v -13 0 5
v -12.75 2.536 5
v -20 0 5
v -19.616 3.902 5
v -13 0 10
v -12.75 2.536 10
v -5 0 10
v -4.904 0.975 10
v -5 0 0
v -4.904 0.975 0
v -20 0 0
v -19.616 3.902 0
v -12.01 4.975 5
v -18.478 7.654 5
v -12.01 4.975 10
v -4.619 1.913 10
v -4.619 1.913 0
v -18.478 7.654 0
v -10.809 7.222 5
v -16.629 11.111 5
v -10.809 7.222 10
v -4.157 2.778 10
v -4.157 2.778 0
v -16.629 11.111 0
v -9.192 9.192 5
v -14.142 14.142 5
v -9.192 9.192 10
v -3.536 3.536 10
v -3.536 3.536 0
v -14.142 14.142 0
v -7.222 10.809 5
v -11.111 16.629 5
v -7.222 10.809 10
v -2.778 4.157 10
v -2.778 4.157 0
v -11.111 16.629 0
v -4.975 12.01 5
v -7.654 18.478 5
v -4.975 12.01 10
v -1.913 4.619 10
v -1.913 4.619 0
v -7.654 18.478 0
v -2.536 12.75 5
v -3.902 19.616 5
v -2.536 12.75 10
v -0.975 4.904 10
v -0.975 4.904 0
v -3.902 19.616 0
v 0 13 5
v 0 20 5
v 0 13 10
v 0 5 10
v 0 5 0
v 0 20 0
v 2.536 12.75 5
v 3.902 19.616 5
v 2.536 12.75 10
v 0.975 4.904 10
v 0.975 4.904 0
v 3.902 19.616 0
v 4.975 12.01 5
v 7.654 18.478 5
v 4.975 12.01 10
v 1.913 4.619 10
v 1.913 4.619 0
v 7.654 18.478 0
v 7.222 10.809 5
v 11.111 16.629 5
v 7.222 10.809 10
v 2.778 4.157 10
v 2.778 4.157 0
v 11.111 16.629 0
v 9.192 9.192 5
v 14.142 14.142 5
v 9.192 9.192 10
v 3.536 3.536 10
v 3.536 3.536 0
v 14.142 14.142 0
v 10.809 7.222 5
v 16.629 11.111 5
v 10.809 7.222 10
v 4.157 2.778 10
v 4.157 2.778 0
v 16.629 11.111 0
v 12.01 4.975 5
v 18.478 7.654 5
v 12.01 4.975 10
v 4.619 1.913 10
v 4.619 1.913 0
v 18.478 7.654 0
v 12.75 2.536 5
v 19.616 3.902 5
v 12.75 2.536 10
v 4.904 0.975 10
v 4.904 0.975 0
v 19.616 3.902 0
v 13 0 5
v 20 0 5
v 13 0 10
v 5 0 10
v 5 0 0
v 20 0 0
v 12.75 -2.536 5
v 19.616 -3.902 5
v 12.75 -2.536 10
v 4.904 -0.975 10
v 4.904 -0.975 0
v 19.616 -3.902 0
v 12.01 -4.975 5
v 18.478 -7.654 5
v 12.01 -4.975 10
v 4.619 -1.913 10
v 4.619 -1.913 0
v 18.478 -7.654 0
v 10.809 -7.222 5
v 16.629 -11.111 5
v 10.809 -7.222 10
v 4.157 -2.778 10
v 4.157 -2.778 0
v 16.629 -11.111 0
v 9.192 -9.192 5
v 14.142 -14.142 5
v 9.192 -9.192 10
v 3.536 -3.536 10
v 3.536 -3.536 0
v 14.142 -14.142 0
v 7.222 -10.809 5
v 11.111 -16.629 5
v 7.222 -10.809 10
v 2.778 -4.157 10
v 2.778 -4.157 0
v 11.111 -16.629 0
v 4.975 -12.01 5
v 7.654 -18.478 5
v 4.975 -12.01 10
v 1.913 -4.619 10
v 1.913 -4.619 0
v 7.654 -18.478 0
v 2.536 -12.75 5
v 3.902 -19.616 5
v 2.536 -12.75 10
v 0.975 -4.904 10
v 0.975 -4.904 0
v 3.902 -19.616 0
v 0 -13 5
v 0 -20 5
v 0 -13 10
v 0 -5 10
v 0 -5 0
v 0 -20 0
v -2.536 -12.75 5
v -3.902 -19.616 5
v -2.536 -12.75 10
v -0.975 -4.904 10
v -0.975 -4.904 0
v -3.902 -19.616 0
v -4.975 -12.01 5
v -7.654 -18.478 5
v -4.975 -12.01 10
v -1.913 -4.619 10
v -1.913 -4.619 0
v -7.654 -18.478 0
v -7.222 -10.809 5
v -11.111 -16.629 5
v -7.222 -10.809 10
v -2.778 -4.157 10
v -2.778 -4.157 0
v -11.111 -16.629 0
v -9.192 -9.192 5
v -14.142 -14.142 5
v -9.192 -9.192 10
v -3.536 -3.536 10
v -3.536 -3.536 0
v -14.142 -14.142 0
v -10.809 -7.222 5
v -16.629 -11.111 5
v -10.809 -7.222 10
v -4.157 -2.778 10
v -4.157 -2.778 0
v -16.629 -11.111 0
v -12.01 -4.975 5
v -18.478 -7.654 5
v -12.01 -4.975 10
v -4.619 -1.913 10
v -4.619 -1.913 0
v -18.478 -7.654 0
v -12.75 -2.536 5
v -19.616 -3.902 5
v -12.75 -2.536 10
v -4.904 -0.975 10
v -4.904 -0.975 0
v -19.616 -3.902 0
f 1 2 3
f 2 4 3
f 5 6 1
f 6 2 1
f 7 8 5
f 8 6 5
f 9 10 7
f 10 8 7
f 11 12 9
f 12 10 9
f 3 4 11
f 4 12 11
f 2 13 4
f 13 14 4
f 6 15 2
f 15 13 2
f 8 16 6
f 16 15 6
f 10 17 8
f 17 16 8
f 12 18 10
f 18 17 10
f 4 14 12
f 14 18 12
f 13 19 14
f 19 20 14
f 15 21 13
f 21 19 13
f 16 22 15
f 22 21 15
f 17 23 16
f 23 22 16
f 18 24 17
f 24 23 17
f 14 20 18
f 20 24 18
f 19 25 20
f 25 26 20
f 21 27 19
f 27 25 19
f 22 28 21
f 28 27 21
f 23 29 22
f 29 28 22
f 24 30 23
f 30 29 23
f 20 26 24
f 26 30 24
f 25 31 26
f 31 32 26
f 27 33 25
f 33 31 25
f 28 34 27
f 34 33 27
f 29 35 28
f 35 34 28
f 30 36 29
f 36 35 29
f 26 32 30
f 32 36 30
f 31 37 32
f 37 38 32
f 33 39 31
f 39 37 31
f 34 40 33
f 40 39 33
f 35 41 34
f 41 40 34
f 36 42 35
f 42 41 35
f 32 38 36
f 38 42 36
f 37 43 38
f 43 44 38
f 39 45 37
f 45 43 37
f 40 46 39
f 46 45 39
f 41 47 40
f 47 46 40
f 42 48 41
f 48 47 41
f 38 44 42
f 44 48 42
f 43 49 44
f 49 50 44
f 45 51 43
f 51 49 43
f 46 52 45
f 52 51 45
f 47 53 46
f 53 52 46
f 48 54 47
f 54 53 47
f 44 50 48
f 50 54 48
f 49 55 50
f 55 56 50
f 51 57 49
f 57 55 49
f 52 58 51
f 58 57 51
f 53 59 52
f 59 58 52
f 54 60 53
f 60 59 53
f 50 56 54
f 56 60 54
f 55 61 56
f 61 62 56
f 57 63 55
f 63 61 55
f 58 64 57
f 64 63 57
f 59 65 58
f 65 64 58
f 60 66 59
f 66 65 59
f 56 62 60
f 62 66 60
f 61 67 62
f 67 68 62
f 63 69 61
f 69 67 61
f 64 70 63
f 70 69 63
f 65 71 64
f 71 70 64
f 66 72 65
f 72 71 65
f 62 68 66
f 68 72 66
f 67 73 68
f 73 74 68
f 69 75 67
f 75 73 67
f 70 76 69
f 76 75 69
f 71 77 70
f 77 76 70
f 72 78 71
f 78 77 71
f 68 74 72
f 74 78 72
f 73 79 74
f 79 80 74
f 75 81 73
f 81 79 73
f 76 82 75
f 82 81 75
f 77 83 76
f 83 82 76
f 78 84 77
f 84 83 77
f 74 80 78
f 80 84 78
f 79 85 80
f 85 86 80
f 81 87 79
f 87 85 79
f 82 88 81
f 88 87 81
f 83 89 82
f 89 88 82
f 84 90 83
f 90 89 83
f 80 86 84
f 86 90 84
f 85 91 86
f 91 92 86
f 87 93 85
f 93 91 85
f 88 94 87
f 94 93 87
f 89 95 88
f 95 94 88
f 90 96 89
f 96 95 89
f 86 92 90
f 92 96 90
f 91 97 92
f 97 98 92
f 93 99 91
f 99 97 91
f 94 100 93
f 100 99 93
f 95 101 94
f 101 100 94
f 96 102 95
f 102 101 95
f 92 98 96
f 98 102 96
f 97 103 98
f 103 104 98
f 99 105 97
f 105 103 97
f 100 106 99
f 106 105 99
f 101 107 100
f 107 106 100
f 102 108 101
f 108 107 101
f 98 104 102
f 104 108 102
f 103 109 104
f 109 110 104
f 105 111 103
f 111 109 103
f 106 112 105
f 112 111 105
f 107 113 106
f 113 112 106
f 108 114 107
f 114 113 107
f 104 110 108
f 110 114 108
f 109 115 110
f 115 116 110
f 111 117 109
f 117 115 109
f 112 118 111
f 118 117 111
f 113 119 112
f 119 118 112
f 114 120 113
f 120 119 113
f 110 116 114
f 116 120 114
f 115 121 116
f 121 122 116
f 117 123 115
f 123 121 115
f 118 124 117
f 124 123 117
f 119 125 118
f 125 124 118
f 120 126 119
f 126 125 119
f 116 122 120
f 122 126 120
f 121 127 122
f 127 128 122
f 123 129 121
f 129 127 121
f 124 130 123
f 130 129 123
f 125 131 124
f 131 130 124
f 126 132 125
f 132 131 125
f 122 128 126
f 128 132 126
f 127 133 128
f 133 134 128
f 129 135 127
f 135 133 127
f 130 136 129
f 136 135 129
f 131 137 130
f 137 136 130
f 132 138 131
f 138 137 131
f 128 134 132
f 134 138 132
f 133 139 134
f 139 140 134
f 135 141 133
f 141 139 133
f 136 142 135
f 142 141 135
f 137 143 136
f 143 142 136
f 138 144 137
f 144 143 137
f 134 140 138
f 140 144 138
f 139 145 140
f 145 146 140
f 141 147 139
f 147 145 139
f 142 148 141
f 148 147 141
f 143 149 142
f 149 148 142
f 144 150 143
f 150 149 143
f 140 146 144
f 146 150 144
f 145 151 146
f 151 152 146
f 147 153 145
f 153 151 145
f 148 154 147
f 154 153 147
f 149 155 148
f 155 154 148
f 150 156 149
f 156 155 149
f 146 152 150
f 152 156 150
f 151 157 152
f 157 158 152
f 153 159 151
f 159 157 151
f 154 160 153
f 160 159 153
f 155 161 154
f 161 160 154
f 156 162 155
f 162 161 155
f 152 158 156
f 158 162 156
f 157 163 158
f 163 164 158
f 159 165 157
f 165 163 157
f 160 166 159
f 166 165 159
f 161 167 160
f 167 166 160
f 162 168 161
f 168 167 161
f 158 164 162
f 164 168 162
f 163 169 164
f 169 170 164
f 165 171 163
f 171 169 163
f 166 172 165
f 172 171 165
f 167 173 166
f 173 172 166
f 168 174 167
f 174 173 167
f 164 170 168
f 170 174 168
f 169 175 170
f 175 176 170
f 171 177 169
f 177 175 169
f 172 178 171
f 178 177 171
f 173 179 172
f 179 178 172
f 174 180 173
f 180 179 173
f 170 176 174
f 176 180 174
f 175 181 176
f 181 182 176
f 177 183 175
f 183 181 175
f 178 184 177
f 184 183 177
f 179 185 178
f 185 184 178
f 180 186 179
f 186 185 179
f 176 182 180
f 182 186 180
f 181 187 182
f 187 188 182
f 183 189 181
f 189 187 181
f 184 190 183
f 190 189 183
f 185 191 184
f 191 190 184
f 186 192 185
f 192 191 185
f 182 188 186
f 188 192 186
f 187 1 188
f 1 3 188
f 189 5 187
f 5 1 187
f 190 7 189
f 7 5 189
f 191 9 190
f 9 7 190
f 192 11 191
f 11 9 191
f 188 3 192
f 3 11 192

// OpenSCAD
$fn = 32;

// ----------------------------------------------------------------------
// Arc stop: collar, 10 mm thick
// ----------------------------------------------------------------------

// --- parameters (mm) ---
revolve_angle = 360;      // full turn around the Z axis
profile_points = 6;       // points of the closed outline

profile = [[5, 0], [20, 0], [20, 5], [13, 5], [13, 10], [5, 10]];  // single closed polygon, 6 points, counter clockwise

// --- the one profile operation ---
rotate_extrude(angle = revolve_angle) polygon(points = profile);
